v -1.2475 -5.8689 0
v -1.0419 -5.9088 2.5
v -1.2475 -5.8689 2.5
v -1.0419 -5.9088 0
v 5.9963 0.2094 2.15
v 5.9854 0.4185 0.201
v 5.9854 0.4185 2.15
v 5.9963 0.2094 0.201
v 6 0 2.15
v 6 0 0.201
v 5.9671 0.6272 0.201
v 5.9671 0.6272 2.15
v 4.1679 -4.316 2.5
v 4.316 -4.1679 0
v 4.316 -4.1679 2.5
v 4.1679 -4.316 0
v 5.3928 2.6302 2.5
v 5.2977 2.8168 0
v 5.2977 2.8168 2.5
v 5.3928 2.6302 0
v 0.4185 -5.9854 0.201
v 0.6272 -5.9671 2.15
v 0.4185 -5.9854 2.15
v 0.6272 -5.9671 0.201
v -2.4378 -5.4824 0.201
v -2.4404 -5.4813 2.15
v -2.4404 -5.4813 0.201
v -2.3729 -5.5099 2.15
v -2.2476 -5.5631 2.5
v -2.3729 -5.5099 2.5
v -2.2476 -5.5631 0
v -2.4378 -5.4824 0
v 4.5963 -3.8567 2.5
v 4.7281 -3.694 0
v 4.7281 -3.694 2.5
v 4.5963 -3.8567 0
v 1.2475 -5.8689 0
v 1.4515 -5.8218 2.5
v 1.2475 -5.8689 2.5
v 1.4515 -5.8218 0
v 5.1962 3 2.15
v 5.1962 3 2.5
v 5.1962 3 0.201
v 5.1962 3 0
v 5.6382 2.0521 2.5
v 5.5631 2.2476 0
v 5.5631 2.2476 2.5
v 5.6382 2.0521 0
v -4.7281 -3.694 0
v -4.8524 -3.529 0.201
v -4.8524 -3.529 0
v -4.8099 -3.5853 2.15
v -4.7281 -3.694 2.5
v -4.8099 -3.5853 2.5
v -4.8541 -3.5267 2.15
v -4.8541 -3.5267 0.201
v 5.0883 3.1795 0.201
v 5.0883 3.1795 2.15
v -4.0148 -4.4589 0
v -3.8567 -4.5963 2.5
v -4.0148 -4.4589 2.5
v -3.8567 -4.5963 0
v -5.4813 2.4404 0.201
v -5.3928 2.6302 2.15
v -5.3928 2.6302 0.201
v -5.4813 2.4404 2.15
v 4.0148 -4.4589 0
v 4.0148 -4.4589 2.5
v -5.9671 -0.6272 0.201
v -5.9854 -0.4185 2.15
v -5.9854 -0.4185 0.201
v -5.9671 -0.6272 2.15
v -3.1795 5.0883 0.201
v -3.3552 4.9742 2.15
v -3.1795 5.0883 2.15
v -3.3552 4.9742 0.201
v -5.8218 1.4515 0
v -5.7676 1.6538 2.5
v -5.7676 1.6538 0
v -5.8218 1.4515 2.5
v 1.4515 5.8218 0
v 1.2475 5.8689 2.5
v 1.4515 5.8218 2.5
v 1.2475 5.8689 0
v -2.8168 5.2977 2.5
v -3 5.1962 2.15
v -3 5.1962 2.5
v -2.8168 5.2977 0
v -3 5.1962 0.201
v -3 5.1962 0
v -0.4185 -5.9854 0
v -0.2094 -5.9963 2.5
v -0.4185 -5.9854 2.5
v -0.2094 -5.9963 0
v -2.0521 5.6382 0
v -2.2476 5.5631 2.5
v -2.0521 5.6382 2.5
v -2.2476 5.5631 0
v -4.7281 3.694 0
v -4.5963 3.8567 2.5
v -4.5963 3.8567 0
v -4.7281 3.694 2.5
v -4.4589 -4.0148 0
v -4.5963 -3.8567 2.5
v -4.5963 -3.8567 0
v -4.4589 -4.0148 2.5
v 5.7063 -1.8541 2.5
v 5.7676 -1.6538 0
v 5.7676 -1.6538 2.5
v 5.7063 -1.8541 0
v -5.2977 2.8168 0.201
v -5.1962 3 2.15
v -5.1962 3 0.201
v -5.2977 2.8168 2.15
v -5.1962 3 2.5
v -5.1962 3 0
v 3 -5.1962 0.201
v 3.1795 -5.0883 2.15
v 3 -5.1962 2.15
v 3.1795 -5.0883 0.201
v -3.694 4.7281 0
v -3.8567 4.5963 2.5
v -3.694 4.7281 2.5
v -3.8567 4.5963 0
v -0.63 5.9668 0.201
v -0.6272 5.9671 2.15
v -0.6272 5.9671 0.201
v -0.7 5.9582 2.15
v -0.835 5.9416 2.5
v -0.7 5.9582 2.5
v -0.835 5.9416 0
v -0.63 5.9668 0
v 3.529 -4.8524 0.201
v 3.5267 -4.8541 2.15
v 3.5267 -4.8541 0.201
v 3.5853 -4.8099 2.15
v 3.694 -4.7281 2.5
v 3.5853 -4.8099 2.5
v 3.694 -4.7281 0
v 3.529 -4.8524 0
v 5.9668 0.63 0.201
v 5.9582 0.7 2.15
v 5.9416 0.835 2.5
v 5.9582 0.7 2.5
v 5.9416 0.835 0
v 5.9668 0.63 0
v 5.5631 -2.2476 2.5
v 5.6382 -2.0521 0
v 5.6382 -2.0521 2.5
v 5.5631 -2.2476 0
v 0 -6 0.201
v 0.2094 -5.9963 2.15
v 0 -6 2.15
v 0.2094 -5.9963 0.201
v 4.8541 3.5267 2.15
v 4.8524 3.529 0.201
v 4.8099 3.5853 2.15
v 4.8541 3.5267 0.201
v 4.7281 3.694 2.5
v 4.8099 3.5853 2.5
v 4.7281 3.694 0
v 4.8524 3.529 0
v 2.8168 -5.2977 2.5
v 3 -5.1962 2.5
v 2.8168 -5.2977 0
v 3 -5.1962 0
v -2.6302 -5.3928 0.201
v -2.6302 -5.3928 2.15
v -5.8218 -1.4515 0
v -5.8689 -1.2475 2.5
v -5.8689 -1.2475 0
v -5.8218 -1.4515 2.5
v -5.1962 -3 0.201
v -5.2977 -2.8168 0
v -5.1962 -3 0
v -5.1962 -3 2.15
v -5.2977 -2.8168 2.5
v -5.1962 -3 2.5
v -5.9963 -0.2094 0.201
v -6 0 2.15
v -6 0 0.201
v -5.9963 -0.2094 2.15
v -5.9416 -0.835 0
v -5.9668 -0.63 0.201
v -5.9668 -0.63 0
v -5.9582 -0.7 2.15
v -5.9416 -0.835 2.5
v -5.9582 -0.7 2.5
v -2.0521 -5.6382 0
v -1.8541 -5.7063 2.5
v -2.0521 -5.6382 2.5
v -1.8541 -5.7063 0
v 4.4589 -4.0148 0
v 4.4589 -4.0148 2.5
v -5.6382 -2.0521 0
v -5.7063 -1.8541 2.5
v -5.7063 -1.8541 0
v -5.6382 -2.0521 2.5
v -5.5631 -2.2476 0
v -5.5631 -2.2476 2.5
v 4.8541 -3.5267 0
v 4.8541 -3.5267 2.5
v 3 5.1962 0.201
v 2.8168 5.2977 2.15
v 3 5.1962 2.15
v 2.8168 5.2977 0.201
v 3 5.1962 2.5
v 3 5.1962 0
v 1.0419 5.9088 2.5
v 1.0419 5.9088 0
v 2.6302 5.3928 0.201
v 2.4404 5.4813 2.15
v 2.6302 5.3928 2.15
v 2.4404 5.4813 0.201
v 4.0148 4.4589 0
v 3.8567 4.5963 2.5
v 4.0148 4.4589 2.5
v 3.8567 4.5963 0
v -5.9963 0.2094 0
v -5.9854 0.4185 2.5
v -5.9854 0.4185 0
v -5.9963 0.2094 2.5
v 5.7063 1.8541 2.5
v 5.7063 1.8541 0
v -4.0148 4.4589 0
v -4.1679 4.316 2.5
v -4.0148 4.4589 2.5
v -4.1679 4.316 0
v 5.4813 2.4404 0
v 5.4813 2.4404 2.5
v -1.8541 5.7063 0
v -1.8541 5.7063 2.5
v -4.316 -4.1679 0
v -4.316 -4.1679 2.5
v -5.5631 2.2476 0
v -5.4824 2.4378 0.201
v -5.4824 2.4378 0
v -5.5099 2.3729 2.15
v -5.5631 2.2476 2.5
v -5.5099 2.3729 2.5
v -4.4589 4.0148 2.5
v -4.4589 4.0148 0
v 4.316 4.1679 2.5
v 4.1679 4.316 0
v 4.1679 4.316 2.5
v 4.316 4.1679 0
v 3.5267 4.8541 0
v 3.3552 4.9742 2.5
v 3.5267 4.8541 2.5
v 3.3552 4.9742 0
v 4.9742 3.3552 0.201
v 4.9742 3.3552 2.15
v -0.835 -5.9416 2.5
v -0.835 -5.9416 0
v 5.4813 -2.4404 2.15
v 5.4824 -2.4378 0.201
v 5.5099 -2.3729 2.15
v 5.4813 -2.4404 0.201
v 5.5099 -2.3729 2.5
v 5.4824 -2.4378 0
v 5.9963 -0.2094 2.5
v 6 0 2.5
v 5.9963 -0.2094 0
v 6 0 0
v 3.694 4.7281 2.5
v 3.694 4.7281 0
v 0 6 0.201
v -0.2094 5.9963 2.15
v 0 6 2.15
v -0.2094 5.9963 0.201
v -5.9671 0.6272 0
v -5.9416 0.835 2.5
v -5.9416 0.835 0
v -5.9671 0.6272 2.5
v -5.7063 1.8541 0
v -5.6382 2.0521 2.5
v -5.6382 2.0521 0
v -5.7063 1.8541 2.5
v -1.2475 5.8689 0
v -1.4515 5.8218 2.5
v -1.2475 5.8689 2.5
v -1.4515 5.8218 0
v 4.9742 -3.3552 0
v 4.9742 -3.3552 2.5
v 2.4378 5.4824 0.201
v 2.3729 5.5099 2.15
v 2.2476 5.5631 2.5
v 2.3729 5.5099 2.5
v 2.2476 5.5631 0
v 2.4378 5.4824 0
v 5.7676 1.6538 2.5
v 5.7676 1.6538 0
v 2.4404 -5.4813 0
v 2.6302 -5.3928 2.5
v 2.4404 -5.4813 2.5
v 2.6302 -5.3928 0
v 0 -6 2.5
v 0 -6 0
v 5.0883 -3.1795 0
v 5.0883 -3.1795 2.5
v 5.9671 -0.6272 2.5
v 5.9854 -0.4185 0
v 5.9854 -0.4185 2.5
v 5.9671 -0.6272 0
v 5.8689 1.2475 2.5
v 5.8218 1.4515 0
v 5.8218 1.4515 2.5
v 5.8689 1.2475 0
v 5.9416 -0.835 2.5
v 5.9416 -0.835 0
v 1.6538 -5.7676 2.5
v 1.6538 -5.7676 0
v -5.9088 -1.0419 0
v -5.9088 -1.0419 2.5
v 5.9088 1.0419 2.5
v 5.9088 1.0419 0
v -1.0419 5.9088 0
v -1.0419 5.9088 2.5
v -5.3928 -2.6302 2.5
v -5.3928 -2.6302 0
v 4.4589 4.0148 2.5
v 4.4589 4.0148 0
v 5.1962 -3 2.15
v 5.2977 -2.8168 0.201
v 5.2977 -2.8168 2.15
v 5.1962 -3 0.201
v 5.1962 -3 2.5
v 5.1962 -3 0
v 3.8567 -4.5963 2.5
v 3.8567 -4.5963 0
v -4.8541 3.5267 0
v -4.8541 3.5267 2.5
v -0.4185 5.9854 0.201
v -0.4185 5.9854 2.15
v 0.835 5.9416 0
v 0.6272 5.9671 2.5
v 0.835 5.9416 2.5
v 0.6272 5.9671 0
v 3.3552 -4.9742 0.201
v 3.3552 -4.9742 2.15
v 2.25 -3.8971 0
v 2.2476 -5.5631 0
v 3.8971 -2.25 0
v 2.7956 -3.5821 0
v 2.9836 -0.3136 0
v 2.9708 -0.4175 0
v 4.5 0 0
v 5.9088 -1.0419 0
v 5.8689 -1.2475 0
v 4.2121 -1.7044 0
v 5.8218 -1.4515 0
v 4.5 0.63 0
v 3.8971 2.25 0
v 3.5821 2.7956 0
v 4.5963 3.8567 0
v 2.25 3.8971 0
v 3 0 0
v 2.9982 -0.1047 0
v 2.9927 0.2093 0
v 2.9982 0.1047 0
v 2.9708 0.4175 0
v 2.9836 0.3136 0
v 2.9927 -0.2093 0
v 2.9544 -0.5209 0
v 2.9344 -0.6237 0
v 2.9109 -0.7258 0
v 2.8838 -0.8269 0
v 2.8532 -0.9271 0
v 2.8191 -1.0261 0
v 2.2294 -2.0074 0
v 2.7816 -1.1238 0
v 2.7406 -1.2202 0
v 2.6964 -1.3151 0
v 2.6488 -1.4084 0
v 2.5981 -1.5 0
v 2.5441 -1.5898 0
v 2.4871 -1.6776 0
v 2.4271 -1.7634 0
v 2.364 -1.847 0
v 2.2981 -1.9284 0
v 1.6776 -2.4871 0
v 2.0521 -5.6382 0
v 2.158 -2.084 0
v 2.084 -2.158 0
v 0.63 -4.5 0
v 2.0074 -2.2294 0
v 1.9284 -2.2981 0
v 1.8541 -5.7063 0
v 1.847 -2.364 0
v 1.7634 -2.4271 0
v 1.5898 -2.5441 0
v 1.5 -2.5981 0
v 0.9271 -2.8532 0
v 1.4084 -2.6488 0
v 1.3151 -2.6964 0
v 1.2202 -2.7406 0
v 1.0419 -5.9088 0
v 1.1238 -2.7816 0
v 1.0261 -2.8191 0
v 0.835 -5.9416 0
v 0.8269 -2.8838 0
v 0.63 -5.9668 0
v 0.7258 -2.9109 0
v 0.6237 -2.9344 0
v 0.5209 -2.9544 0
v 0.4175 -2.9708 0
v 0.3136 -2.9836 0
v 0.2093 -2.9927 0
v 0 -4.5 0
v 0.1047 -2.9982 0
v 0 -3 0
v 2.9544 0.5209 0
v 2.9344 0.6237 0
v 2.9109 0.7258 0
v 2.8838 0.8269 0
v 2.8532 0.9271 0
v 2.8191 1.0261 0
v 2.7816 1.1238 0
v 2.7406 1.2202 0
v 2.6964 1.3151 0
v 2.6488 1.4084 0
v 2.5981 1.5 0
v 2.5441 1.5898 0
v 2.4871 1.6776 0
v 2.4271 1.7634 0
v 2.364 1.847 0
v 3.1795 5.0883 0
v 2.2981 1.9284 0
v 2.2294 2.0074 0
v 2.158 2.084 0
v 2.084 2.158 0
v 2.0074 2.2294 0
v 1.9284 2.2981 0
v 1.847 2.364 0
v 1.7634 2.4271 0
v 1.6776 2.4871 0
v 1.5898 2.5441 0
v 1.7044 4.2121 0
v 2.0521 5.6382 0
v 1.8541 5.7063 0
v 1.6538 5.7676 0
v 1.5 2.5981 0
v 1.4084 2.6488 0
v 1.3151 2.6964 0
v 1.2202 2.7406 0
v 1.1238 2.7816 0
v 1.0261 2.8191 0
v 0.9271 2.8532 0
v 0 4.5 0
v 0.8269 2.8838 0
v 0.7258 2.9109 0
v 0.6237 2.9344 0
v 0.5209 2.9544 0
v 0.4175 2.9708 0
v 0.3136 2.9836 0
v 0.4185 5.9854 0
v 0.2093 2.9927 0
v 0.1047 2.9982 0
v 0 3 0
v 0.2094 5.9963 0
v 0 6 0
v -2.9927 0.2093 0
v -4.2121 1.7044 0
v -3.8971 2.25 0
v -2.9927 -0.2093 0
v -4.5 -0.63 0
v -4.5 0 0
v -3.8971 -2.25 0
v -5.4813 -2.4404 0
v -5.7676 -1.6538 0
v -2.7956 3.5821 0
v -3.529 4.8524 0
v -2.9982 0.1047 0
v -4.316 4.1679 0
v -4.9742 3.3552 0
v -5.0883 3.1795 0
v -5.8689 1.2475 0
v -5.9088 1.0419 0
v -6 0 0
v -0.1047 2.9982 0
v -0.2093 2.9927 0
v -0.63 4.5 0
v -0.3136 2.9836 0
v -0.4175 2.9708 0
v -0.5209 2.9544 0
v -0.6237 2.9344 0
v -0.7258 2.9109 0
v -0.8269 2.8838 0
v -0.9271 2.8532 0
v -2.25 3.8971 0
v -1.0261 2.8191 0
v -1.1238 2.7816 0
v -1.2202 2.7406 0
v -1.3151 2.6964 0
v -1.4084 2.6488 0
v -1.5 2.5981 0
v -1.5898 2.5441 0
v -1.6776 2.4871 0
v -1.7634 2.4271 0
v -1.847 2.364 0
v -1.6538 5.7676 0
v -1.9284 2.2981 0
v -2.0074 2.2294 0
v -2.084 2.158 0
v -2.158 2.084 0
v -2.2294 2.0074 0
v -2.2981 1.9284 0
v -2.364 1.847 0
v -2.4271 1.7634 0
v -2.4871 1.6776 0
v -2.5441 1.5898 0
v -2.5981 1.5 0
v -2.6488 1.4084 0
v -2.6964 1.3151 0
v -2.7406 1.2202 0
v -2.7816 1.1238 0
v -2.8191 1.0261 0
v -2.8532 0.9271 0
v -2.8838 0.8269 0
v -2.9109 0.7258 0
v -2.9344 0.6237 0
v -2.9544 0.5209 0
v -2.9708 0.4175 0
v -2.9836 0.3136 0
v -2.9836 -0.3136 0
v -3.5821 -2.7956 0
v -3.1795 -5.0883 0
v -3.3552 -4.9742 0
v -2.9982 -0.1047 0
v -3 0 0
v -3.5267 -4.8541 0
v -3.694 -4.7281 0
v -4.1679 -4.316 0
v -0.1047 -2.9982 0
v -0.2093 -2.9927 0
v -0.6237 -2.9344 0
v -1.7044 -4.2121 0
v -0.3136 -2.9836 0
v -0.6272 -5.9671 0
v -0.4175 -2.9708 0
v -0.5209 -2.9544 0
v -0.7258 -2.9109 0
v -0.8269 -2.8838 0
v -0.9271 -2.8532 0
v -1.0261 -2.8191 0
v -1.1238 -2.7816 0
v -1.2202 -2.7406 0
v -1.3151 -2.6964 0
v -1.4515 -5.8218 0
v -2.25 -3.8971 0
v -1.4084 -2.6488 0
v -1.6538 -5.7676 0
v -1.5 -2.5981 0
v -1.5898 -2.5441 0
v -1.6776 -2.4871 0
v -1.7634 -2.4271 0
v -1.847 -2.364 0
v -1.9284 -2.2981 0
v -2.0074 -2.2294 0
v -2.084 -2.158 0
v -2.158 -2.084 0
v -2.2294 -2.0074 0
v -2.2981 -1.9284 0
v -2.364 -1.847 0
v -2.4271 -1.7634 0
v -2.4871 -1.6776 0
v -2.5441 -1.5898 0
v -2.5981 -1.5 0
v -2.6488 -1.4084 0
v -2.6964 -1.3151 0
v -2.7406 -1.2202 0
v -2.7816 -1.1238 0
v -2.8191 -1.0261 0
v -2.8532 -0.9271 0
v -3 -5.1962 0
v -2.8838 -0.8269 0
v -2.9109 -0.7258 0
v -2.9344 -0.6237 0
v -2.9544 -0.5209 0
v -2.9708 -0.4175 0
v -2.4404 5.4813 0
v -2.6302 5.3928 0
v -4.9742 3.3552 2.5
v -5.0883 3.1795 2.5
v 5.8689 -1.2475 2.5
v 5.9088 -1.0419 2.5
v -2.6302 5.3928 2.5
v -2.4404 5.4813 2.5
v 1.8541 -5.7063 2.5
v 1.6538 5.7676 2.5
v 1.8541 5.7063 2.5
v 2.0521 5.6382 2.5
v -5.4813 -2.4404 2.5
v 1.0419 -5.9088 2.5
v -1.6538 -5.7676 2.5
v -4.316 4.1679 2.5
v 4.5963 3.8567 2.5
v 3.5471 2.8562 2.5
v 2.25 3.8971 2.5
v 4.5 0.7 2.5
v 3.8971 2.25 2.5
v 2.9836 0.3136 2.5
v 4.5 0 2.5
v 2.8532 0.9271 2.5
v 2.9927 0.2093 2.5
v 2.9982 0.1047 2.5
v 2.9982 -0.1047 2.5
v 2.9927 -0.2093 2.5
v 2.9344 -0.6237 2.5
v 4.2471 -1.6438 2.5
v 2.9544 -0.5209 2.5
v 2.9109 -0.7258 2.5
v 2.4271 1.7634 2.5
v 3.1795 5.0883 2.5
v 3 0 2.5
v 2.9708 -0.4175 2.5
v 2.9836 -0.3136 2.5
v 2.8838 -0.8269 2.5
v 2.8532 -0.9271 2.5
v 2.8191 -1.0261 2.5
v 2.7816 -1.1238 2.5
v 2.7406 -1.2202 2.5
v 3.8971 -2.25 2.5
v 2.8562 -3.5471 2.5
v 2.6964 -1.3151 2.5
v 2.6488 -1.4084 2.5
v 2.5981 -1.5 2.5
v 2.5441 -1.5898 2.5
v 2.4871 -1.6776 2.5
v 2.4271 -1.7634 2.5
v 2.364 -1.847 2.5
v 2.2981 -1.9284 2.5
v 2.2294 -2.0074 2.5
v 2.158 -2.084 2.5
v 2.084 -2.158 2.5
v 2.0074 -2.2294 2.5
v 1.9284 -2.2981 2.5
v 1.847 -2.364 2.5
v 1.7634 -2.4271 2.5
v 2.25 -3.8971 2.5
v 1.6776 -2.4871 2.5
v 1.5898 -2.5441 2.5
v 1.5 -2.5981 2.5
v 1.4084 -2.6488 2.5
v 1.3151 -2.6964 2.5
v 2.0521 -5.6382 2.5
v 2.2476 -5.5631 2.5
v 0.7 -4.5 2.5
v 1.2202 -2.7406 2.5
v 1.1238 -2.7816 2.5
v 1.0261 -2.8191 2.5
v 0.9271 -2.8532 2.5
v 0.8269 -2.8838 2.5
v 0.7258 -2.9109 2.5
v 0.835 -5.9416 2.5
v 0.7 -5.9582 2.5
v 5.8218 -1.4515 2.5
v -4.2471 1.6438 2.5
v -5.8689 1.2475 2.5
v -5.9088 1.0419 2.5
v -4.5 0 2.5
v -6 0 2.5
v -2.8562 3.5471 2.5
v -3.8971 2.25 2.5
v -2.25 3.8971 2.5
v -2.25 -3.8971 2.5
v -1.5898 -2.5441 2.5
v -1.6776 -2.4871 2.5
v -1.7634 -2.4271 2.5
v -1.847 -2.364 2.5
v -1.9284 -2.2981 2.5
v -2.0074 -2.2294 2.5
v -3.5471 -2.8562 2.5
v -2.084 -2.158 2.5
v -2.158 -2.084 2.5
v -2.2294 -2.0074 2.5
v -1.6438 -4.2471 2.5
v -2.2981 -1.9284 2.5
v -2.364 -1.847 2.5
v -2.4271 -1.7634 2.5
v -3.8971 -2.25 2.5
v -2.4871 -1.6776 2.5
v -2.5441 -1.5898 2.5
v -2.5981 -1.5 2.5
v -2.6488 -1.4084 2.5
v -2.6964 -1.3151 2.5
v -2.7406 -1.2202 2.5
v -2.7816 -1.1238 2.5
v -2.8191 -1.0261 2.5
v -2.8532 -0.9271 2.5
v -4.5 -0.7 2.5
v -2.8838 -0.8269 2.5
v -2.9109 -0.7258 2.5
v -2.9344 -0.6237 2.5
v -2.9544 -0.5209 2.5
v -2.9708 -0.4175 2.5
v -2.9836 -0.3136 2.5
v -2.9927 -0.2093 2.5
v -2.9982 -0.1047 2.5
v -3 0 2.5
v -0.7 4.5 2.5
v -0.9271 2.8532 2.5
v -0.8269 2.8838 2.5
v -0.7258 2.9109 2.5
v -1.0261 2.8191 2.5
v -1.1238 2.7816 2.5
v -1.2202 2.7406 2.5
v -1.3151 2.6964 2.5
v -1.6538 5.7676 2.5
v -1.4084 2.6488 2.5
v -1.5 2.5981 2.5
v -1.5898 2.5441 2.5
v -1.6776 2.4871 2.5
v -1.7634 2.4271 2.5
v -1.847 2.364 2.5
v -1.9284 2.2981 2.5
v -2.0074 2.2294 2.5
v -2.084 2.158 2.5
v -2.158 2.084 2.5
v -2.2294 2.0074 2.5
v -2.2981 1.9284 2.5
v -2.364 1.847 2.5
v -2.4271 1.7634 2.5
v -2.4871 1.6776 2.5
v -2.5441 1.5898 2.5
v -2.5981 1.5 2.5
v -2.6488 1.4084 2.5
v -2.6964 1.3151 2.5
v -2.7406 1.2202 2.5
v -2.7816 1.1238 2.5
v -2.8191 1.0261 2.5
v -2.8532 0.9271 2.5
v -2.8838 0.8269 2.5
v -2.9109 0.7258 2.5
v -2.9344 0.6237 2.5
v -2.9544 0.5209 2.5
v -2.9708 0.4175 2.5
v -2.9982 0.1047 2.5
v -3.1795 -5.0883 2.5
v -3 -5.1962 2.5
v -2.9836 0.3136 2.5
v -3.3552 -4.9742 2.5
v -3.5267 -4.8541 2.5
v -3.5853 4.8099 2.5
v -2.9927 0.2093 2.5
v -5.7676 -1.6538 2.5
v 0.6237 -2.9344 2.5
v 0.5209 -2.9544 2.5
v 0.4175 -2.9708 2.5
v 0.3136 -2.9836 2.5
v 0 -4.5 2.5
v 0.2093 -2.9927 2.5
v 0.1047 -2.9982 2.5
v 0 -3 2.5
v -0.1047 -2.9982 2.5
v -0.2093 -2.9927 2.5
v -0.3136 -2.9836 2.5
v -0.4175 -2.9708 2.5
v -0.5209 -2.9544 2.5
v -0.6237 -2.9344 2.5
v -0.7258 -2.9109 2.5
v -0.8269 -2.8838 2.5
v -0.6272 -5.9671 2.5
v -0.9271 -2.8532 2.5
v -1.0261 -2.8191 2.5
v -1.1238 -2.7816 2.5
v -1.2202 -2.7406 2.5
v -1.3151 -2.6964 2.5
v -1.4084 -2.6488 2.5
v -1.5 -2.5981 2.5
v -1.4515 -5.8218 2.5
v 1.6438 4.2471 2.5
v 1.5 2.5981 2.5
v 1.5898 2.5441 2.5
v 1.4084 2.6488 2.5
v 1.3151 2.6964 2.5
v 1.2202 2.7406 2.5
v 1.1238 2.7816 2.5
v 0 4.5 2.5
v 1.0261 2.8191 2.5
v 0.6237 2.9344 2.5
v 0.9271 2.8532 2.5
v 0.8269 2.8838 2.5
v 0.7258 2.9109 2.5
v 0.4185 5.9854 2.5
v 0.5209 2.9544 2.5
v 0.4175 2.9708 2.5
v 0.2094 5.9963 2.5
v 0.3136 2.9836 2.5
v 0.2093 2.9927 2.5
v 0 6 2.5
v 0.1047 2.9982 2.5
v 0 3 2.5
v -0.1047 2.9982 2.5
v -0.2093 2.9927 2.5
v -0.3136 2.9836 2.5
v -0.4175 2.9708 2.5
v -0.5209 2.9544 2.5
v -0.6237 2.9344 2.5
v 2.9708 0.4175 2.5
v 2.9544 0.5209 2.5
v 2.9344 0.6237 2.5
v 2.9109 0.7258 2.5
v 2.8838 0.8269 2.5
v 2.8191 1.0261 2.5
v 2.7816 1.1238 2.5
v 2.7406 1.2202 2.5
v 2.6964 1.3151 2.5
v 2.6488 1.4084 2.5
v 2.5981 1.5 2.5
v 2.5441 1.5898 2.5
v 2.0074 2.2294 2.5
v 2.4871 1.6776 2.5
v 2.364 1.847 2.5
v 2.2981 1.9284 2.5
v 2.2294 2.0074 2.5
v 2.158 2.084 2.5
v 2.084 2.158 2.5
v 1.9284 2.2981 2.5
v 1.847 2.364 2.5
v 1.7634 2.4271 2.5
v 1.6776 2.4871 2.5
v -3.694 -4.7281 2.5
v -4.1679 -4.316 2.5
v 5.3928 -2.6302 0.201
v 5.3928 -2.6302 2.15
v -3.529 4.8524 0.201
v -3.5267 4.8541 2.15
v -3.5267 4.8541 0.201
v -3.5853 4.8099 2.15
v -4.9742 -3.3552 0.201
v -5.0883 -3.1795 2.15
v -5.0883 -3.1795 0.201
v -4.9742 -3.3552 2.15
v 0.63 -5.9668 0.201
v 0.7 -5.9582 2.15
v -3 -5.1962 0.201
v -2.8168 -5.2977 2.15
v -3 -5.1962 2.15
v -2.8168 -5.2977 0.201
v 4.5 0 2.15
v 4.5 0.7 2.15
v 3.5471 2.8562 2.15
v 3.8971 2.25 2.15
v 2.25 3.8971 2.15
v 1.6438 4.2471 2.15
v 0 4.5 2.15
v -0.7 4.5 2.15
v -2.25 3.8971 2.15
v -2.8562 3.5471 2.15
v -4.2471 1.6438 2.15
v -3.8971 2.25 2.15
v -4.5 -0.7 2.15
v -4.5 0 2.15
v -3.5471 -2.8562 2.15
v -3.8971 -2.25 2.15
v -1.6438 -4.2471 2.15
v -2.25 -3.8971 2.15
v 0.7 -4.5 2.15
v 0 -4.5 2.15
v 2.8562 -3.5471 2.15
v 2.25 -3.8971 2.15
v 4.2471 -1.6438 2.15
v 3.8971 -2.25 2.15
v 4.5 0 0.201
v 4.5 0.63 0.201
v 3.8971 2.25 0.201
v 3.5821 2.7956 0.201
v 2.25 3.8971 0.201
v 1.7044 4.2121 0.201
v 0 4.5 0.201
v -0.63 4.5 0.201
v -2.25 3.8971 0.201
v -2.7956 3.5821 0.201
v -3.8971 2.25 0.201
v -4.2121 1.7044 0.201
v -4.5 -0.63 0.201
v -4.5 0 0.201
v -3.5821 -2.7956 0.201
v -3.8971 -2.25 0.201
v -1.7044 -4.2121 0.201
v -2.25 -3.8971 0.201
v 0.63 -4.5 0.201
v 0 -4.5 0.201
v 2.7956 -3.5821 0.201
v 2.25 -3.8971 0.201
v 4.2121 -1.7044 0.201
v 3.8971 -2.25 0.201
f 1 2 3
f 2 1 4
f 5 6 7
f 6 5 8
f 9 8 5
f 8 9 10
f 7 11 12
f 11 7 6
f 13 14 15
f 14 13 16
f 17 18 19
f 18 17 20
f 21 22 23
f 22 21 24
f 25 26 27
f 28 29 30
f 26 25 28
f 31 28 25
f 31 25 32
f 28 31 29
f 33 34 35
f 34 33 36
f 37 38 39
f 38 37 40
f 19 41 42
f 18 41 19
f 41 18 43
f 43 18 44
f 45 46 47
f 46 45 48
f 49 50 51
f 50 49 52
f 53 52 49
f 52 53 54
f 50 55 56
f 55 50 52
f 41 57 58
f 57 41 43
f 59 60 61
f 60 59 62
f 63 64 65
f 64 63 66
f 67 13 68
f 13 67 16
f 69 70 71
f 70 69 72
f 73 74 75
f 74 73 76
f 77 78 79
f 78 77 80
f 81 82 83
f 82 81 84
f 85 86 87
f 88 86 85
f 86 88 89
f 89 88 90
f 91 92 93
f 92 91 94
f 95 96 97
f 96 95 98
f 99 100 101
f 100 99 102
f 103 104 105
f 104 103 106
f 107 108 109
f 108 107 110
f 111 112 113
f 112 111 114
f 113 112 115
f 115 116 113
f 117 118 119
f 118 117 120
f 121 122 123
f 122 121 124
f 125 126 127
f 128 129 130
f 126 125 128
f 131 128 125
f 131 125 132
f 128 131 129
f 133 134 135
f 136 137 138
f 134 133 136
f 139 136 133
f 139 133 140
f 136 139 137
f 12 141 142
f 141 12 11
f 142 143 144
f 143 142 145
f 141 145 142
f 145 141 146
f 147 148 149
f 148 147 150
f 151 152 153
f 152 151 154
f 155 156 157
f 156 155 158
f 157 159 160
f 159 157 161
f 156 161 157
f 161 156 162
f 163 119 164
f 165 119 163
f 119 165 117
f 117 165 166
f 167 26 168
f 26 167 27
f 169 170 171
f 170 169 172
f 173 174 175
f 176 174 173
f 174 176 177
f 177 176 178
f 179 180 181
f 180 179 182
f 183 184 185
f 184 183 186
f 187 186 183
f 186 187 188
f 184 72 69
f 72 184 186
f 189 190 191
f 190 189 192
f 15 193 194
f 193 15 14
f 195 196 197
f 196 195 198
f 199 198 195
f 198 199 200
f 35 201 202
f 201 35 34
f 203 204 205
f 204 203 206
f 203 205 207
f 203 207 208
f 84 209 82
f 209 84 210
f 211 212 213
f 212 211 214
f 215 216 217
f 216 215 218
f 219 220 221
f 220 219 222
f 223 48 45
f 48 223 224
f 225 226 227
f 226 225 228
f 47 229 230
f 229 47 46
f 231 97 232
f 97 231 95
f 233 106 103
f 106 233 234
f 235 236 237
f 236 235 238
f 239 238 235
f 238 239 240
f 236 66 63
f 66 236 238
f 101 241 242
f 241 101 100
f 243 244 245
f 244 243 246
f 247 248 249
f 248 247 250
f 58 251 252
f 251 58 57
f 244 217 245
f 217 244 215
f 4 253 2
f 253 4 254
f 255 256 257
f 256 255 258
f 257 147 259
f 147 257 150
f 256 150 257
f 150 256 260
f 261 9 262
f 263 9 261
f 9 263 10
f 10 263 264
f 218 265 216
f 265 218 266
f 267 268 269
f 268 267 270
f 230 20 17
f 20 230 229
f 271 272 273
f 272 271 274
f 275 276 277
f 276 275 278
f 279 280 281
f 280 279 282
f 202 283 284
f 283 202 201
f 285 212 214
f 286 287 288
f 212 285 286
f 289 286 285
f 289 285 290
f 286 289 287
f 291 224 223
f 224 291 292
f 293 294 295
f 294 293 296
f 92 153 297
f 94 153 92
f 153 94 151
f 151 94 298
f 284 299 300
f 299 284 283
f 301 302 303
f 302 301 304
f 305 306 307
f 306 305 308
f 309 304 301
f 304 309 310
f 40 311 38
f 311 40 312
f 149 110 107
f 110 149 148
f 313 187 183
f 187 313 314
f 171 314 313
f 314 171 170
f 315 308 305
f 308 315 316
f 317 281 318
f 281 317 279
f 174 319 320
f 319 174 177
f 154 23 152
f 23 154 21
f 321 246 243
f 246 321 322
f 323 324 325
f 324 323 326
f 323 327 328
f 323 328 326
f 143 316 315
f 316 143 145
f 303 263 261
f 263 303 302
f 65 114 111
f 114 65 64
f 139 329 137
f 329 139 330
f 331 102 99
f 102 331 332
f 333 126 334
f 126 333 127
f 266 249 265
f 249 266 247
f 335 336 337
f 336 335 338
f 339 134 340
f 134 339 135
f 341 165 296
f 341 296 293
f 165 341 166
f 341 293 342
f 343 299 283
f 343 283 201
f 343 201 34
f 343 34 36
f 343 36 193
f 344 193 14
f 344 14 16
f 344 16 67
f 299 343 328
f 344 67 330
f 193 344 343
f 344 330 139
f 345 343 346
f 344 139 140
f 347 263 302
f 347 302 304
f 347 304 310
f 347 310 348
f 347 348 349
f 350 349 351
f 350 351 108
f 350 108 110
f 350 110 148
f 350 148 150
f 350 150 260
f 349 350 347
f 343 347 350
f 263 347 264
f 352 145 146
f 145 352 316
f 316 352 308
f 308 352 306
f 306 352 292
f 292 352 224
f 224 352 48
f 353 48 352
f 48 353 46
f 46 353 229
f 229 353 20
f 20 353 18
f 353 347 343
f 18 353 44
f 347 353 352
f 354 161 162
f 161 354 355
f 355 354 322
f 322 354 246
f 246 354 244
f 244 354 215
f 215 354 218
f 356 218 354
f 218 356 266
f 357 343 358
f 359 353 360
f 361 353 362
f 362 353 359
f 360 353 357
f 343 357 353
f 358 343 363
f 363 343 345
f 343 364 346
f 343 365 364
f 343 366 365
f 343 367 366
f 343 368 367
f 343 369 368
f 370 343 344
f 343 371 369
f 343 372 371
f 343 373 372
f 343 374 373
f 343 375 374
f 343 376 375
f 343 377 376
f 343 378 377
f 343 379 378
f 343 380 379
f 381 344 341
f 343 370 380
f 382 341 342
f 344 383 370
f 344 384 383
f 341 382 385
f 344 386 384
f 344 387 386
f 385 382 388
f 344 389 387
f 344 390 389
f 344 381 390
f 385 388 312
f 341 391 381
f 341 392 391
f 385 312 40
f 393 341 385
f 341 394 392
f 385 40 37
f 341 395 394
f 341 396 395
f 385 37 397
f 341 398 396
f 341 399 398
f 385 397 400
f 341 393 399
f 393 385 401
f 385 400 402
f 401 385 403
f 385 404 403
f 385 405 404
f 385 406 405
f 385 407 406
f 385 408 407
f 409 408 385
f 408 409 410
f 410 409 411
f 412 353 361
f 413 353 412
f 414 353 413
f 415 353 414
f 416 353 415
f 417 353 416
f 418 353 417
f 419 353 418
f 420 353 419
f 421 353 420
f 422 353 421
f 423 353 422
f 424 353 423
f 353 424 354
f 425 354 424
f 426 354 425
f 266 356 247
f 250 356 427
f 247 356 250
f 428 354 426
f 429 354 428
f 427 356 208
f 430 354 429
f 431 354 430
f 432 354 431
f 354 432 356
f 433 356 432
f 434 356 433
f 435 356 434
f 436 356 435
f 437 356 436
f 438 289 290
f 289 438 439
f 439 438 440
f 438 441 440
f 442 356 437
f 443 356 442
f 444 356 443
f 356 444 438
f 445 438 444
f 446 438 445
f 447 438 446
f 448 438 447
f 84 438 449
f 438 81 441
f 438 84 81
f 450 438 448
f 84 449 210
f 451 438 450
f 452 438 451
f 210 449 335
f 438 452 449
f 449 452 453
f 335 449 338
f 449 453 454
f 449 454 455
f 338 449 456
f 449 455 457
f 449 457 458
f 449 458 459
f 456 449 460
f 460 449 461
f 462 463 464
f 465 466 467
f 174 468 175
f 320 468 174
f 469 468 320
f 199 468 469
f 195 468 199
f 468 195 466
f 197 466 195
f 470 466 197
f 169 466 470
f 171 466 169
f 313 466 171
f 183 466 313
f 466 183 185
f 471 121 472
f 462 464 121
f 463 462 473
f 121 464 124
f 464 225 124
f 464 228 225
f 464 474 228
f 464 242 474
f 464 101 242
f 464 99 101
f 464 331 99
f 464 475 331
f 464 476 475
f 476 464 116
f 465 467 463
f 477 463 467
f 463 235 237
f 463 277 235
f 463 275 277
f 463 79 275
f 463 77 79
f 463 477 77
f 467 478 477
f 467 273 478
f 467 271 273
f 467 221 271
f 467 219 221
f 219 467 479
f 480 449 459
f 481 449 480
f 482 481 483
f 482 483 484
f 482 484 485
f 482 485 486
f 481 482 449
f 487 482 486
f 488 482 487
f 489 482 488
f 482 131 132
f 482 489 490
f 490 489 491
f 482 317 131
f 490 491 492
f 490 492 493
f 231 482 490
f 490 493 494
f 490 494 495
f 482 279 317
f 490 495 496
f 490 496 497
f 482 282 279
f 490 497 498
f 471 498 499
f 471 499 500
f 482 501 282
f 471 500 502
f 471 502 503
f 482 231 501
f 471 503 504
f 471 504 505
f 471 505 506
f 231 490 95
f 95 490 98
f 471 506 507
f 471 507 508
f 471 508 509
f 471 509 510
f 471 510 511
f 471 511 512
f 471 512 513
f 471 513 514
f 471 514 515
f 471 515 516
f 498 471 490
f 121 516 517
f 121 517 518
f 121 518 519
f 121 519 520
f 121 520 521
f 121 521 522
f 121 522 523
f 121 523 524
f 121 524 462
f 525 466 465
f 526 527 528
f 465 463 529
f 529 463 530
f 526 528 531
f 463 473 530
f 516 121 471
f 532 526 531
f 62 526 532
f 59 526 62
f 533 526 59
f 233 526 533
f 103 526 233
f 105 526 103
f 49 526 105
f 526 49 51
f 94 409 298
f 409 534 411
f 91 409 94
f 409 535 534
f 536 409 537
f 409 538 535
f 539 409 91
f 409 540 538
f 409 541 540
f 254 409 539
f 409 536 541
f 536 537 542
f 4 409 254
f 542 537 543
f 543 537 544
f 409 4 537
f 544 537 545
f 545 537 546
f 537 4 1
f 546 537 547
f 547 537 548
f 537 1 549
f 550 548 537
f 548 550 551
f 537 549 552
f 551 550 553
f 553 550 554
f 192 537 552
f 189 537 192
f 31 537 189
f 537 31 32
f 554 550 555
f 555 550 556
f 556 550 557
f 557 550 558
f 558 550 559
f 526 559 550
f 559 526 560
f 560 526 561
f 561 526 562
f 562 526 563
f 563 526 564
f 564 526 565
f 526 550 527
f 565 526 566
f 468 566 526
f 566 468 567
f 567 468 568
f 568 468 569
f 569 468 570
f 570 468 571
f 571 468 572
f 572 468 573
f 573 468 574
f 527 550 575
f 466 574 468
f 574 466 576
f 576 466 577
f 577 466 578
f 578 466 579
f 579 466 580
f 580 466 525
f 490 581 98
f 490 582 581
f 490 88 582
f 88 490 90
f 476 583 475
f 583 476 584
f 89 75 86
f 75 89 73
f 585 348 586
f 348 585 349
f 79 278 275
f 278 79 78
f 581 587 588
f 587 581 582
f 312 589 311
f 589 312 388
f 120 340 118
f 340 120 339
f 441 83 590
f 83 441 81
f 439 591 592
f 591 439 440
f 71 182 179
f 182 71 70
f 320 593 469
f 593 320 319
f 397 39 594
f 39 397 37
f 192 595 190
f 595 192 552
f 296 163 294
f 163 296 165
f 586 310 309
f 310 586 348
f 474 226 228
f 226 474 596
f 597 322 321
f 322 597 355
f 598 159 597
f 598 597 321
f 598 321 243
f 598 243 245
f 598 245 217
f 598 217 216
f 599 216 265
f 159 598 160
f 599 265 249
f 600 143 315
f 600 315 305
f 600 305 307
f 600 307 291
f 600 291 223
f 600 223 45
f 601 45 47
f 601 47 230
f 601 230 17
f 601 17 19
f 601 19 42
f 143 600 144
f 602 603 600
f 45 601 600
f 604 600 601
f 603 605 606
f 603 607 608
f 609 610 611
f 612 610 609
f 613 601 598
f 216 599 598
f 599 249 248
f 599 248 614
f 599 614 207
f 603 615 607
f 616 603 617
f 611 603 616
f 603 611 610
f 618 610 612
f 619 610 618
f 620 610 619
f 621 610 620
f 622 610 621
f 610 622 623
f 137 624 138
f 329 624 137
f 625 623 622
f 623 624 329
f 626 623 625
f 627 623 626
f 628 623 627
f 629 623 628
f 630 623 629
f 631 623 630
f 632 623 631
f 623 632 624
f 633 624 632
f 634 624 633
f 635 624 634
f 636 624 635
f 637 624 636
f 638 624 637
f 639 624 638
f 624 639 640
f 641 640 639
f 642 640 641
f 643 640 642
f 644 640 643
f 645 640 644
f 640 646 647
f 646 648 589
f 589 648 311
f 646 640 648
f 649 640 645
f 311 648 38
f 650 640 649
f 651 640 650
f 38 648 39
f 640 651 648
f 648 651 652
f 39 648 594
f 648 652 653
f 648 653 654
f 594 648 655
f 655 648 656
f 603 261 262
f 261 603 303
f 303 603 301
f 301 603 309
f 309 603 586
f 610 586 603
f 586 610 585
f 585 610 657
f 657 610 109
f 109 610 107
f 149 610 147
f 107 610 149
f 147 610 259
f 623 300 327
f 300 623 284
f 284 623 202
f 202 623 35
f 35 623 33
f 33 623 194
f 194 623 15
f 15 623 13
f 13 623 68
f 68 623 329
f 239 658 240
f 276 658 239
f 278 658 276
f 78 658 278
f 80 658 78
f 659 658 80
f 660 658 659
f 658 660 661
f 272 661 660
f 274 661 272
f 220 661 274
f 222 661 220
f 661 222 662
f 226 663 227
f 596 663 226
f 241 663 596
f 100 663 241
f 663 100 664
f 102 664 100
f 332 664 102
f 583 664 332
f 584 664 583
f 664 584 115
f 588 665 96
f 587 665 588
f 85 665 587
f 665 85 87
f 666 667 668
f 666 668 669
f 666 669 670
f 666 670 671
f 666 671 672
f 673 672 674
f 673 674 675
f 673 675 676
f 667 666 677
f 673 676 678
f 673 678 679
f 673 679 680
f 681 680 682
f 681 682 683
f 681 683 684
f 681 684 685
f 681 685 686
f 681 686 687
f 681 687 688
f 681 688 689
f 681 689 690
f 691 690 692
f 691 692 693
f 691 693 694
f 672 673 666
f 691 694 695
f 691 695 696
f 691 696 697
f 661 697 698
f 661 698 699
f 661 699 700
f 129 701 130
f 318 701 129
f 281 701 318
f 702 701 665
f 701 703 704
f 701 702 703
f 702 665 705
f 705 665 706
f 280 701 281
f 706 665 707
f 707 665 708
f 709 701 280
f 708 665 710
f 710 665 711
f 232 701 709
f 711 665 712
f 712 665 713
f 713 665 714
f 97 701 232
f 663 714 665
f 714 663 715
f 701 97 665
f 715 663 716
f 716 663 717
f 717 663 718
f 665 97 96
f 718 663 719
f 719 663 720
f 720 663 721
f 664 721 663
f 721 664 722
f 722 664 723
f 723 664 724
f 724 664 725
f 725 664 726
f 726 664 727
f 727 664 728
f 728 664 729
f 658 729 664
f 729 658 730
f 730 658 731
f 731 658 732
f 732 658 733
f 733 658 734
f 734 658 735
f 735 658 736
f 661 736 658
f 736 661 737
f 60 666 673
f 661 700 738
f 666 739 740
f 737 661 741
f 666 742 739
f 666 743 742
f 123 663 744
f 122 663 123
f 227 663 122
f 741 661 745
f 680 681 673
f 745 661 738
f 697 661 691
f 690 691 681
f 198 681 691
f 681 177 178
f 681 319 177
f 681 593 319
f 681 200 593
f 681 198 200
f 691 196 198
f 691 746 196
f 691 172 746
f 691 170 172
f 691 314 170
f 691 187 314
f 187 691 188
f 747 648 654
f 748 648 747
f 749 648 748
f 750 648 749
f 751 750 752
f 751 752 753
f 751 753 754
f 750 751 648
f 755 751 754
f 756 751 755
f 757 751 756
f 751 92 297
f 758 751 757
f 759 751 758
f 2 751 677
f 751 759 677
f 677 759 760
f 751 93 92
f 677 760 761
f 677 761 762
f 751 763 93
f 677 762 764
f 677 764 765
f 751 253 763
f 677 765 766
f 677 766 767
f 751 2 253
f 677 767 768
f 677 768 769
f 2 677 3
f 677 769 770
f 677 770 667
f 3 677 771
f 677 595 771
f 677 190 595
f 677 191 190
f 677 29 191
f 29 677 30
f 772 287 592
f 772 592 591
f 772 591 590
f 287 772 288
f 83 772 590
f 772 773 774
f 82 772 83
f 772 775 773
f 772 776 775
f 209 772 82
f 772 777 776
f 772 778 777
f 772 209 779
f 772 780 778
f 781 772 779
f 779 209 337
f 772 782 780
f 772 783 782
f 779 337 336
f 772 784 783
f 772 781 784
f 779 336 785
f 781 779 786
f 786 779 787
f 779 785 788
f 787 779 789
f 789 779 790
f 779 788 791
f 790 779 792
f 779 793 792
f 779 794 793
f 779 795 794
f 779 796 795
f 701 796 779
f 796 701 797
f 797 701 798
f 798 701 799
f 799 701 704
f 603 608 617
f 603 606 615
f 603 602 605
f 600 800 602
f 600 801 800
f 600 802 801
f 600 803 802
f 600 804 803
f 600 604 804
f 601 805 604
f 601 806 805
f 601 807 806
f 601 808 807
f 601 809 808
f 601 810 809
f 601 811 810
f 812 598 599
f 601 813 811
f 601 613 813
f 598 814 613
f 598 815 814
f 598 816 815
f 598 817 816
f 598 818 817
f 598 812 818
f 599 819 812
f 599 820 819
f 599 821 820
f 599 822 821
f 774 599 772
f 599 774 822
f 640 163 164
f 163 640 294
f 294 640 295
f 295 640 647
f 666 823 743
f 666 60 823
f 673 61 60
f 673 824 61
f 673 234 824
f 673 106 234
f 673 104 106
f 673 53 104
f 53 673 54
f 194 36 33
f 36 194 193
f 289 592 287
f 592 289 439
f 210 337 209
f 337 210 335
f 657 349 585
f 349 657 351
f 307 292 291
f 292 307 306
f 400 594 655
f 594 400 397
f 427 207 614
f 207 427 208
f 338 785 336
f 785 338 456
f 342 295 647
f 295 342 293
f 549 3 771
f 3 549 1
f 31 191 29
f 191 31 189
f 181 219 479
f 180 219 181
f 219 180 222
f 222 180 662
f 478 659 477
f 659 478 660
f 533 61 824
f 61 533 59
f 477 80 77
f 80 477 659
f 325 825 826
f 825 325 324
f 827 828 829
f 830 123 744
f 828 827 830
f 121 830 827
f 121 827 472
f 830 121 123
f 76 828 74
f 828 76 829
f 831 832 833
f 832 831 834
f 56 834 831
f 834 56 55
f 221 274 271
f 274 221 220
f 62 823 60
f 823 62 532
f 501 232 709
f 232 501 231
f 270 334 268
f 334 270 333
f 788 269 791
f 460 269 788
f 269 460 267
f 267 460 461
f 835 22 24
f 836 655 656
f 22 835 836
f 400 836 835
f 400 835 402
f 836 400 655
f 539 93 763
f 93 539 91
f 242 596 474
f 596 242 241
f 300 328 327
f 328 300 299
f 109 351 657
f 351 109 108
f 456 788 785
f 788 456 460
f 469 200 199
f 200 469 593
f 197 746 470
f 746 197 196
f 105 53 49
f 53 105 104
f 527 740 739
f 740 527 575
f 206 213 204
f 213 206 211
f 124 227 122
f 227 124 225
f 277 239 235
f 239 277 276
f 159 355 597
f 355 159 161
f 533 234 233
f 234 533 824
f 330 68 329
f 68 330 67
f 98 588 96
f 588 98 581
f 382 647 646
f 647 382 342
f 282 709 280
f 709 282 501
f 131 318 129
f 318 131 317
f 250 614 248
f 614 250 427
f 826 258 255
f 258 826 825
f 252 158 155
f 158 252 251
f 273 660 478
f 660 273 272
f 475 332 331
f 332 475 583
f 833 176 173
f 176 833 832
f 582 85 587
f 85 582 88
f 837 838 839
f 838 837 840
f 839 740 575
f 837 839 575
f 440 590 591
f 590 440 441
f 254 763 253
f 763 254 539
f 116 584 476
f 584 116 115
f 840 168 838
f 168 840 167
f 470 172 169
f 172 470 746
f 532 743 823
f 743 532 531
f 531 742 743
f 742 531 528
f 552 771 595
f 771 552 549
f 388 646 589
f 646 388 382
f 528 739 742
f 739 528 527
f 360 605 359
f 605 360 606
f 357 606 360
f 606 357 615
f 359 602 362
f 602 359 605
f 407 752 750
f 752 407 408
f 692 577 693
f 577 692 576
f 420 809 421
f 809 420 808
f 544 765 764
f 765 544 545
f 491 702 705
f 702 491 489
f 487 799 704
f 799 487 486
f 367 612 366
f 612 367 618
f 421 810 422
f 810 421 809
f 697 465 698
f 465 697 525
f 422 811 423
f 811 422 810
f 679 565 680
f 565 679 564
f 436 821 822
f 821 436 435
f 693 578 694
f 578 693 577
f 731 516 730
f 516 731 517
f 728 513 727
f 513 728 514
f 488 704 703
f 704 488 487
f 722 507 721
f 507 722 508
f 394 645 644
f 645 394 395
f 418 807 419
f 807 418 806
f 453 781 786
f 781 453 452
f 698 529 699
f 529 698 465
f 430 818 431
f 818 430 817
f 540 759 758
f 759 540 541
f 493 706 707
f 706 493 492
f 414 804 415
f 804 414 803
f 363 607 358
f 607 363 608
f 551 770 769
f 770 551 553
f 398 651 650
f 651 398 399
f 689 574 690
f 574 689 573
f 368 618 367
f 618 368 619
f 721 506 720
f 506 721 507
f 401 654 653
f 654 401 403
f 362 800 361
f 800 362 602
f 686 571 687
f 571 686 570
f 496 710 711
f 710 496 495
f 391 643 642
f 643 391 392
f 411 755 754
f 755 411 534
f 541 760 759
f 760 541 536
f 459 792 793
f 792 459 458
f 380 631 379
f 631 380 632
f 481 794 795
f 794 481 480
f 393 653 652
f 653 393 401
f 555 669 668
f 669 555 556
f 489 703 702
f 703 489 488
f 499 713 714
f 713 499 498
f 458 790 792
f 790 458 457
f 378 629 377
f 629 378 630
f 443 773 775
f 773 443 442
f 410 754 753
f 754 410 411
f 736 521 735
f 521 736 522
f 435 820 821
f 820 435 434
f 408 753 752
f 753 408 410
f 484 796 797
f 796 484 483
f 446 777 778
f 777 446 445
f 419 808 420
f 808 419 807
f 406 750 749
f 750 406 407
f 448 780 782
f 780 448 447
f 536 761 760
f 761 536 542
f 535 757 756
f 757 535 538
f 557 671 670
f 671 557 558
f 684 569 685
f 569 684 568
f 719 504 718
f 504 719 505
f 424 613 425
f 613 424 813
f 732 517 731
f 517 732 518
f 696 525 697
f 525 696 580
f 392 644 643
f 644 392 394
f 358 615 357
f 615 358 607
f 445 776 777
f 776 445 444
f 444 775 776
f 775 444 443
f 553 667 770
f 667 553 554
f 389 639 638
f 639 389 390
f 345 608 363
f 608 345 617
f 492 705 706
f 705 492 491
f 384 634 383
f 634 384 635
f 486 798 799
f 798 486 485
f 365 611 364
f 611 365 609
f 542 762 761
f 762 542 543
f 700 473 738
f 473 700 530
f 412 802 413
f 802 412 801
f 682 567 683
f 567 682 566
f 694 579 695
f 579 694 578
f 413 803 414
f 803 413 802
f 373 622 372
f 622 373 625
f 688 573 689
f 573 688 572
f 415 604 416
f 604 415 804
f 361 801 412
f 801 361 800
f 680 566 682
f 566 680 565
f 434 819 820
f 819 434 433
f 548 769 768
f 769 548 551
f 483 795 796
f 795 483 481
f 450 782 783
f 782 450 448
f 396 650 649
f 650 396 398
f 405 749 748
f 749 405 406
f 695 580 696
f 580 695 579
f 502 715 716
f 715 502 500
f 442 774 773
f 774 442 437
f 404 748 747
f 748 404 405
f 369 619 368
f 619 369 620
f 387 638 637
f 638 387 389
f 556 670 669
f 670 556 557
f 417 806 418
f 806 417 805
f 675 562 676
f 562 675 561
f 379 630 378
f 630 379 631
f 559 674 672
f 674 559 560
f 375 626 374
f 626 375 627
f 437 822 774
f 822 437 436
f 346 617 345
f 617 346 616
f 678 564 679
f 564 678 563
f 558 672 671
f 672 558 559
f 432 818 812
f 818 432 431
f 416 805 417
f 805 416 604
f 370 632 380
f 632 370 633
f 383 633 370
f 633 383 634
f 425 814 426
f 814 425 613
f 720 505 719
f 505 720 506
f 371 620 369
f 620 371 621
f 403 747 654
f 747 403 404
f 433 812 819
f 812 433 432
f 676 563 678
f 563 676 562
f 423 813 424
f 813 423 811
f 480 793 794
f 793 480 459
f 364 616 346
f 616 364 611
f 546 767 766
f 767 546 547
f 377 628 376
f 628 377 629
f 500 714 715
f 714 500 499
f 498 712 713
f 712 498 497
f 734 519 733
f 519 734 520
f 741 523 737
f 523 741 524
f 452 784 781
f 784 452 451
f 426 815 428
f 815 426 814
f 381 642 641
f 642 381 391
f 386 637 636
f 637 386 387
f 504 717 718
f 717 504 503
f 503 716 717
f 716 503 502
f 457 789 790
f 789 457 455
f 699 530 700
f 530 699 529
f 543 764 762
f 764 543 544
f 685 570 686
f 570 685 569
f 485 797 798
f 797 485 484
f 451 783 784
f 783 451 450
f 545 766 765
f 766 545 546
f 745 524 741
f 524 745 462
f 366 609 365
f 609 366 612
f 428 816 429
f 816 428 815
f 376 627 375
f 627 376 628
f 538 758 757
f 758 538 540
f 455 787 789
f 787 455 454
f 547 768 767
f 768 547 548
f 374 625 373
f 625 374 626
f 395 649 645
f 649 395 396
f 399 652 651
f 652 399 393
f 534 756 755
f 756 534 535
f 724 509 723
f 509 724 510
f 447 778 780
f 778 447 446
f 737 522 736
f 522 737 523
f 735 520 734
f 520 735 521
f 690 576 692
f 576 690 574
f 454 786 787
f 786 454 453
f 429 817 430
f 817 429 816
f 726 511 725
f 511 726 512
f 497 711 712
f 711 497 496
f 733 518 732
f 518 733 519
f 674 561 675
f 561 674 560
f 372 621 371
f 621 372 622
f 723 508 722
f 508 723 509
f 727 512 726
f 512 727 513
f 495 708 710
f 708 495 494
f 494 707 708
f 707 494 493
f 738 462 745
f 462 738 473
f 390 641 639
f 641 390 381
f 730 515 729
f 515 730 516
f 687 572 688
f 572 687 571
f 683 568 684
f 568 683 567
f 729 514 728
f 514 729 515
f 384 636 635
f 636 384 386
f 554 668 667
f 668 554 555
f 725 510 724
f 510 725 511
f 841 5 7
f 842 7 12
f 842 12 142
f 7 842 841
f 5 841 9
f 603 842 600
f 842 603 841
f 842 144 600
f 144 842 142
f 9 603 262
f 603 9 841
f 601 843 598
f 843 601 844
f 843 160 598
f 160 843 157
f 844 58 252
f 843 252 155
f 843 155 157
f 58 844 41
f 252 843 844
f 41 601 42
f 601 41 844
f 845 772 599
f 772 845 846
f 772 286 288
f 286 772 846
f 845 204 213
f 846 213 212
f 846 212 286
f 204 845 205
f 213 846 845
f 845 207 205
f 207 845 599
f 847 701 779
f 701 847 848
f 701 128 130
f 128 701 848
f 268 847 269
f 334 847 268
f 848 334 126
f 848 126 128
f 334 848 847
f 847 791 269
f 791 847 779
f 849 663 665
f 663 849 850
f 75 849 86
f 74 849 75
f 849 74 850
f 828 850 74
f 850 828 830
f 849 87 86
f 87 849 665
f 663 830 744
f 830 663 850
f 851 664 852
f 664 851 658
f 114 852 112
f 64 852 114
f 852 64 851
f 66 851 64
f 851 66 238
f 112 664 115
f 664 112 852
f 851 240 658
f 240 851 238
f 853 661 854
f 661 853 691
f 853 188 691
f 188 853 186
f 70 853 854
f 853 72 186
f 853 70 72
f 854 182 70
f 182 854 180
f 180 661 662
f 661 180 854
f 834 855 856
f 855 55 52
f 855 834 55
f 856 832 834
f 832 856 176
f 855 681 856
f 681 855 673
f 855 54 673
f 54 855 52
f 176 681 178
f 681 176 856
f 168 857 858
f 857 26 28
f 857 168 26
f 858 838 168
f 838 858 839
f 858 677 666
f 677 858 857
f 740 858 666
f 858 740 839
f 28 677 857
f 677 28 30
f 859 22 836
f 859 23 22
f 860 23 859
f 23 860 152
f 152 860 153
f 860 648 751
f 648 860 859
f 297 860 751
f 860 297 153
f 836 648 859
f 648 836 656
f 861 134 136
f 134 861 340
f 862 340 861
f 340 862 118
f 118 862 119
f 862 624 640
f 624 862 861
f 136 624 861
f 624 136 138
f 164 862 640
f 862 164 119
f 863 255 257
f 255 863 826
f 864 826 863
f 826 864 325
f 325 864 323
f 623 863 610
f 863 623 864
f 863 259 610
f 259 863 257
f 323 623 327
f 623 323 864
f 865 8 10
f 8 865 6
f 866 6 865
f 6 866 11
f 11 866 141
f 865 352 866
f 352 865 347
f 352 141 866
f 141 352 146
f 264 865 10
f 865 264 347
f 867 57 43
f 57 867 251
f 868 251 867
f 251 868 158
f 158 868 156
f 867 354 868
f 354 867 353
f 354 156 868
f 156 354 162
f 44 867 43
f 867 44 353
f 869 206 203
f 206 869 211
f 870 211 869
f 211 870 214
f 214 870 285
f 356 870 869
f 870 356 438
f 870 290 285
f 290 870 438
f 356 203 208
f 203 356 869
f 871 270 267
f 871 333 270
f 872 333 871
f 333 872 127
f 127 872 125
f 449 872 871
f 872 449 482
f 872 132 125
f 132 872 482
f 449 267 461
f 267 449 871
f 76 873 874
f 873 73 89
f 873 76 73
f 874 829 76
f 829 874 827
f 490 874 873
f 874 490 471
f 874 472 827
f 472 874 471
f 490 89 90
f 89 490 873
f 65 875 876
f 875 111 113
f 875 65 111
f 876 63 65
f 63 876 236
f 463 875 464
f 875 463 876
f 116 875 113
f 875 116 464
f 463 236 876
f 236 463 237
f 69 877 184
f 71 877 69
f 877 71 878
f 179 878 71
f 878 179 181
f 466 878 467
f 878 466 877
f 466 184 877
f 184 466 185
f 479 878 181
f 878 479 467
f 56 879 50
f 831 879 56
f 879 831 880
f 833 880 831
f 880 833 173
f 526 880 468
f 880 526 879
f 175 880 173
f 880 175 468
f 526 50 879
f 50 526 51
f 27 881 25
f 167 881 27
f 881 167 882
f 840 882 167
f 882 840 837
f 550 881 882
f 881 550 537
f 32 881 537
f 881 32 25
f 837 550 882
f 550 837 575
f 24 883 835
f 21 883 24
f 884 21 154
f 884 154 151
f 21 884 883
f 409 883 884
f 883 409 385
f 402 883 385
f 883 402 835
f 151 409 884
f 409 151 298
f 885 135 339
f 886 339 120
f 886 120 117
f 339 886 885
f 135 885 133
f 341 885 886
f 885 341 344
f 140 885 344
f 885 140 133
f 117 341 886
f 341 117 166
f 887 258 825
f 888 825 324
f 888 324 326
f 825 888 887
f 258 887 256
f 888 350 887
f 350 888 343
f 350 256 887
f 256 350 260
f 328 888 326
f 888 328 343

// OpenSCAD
$fn=180;

// Radial encoder magnet (ring magnet with alternating N/S poles around the circumference)
// Model: a thin ring with shallow radial grooves to visually indicate pole segments.
// Dimensions are parametric and suitable for rendering/printing a representative encoder magnet.

outer_d = 12;        // mm
inner_d = 6;         // mm (shaft hole)
thickness = 2.5;     // mm
segments = 12;       // number of pole pairs/segments around the ring
groove_depth = 0.35; // mm (visual pole segmentation)
groove_width = 0.7;  // mm (tangential width at mid-radius)

module ring(od, id, h){
    difference(){
        cylinder(d=od, h=h);
        translate([0,0,-0.1]) cylinder(d=id, h=h+0.2);
    }
}

module radial_grooves(od, id, h, n, depth, w){
    r_mid = (od + id)/4; // mid radius
    for(i=[0:n-1]){
        a = 360/n * i;
        rotate([0,0,a])
            translate([r_mid,0,h - depth])
                cube([ (od-id)/2 + 1, w, depth + 0.2 ], center=false);
    }
}

difference(){
    ring(outer_d, inner_d, thickness);

    // Cut shallow grooves on the top face to indicate alternating poles
    radial_grooves(outer_d, inner_d, thickness, segments, groove_depth, groove_width);

    // Optional: slight chamfer-like relief on bottom face (very subtle)
    translate([0,0,0])
        radial_grooves(outer_d, inner_d, 0.001, segments, groove_depth*0.6, groove_width*0.9);
}
